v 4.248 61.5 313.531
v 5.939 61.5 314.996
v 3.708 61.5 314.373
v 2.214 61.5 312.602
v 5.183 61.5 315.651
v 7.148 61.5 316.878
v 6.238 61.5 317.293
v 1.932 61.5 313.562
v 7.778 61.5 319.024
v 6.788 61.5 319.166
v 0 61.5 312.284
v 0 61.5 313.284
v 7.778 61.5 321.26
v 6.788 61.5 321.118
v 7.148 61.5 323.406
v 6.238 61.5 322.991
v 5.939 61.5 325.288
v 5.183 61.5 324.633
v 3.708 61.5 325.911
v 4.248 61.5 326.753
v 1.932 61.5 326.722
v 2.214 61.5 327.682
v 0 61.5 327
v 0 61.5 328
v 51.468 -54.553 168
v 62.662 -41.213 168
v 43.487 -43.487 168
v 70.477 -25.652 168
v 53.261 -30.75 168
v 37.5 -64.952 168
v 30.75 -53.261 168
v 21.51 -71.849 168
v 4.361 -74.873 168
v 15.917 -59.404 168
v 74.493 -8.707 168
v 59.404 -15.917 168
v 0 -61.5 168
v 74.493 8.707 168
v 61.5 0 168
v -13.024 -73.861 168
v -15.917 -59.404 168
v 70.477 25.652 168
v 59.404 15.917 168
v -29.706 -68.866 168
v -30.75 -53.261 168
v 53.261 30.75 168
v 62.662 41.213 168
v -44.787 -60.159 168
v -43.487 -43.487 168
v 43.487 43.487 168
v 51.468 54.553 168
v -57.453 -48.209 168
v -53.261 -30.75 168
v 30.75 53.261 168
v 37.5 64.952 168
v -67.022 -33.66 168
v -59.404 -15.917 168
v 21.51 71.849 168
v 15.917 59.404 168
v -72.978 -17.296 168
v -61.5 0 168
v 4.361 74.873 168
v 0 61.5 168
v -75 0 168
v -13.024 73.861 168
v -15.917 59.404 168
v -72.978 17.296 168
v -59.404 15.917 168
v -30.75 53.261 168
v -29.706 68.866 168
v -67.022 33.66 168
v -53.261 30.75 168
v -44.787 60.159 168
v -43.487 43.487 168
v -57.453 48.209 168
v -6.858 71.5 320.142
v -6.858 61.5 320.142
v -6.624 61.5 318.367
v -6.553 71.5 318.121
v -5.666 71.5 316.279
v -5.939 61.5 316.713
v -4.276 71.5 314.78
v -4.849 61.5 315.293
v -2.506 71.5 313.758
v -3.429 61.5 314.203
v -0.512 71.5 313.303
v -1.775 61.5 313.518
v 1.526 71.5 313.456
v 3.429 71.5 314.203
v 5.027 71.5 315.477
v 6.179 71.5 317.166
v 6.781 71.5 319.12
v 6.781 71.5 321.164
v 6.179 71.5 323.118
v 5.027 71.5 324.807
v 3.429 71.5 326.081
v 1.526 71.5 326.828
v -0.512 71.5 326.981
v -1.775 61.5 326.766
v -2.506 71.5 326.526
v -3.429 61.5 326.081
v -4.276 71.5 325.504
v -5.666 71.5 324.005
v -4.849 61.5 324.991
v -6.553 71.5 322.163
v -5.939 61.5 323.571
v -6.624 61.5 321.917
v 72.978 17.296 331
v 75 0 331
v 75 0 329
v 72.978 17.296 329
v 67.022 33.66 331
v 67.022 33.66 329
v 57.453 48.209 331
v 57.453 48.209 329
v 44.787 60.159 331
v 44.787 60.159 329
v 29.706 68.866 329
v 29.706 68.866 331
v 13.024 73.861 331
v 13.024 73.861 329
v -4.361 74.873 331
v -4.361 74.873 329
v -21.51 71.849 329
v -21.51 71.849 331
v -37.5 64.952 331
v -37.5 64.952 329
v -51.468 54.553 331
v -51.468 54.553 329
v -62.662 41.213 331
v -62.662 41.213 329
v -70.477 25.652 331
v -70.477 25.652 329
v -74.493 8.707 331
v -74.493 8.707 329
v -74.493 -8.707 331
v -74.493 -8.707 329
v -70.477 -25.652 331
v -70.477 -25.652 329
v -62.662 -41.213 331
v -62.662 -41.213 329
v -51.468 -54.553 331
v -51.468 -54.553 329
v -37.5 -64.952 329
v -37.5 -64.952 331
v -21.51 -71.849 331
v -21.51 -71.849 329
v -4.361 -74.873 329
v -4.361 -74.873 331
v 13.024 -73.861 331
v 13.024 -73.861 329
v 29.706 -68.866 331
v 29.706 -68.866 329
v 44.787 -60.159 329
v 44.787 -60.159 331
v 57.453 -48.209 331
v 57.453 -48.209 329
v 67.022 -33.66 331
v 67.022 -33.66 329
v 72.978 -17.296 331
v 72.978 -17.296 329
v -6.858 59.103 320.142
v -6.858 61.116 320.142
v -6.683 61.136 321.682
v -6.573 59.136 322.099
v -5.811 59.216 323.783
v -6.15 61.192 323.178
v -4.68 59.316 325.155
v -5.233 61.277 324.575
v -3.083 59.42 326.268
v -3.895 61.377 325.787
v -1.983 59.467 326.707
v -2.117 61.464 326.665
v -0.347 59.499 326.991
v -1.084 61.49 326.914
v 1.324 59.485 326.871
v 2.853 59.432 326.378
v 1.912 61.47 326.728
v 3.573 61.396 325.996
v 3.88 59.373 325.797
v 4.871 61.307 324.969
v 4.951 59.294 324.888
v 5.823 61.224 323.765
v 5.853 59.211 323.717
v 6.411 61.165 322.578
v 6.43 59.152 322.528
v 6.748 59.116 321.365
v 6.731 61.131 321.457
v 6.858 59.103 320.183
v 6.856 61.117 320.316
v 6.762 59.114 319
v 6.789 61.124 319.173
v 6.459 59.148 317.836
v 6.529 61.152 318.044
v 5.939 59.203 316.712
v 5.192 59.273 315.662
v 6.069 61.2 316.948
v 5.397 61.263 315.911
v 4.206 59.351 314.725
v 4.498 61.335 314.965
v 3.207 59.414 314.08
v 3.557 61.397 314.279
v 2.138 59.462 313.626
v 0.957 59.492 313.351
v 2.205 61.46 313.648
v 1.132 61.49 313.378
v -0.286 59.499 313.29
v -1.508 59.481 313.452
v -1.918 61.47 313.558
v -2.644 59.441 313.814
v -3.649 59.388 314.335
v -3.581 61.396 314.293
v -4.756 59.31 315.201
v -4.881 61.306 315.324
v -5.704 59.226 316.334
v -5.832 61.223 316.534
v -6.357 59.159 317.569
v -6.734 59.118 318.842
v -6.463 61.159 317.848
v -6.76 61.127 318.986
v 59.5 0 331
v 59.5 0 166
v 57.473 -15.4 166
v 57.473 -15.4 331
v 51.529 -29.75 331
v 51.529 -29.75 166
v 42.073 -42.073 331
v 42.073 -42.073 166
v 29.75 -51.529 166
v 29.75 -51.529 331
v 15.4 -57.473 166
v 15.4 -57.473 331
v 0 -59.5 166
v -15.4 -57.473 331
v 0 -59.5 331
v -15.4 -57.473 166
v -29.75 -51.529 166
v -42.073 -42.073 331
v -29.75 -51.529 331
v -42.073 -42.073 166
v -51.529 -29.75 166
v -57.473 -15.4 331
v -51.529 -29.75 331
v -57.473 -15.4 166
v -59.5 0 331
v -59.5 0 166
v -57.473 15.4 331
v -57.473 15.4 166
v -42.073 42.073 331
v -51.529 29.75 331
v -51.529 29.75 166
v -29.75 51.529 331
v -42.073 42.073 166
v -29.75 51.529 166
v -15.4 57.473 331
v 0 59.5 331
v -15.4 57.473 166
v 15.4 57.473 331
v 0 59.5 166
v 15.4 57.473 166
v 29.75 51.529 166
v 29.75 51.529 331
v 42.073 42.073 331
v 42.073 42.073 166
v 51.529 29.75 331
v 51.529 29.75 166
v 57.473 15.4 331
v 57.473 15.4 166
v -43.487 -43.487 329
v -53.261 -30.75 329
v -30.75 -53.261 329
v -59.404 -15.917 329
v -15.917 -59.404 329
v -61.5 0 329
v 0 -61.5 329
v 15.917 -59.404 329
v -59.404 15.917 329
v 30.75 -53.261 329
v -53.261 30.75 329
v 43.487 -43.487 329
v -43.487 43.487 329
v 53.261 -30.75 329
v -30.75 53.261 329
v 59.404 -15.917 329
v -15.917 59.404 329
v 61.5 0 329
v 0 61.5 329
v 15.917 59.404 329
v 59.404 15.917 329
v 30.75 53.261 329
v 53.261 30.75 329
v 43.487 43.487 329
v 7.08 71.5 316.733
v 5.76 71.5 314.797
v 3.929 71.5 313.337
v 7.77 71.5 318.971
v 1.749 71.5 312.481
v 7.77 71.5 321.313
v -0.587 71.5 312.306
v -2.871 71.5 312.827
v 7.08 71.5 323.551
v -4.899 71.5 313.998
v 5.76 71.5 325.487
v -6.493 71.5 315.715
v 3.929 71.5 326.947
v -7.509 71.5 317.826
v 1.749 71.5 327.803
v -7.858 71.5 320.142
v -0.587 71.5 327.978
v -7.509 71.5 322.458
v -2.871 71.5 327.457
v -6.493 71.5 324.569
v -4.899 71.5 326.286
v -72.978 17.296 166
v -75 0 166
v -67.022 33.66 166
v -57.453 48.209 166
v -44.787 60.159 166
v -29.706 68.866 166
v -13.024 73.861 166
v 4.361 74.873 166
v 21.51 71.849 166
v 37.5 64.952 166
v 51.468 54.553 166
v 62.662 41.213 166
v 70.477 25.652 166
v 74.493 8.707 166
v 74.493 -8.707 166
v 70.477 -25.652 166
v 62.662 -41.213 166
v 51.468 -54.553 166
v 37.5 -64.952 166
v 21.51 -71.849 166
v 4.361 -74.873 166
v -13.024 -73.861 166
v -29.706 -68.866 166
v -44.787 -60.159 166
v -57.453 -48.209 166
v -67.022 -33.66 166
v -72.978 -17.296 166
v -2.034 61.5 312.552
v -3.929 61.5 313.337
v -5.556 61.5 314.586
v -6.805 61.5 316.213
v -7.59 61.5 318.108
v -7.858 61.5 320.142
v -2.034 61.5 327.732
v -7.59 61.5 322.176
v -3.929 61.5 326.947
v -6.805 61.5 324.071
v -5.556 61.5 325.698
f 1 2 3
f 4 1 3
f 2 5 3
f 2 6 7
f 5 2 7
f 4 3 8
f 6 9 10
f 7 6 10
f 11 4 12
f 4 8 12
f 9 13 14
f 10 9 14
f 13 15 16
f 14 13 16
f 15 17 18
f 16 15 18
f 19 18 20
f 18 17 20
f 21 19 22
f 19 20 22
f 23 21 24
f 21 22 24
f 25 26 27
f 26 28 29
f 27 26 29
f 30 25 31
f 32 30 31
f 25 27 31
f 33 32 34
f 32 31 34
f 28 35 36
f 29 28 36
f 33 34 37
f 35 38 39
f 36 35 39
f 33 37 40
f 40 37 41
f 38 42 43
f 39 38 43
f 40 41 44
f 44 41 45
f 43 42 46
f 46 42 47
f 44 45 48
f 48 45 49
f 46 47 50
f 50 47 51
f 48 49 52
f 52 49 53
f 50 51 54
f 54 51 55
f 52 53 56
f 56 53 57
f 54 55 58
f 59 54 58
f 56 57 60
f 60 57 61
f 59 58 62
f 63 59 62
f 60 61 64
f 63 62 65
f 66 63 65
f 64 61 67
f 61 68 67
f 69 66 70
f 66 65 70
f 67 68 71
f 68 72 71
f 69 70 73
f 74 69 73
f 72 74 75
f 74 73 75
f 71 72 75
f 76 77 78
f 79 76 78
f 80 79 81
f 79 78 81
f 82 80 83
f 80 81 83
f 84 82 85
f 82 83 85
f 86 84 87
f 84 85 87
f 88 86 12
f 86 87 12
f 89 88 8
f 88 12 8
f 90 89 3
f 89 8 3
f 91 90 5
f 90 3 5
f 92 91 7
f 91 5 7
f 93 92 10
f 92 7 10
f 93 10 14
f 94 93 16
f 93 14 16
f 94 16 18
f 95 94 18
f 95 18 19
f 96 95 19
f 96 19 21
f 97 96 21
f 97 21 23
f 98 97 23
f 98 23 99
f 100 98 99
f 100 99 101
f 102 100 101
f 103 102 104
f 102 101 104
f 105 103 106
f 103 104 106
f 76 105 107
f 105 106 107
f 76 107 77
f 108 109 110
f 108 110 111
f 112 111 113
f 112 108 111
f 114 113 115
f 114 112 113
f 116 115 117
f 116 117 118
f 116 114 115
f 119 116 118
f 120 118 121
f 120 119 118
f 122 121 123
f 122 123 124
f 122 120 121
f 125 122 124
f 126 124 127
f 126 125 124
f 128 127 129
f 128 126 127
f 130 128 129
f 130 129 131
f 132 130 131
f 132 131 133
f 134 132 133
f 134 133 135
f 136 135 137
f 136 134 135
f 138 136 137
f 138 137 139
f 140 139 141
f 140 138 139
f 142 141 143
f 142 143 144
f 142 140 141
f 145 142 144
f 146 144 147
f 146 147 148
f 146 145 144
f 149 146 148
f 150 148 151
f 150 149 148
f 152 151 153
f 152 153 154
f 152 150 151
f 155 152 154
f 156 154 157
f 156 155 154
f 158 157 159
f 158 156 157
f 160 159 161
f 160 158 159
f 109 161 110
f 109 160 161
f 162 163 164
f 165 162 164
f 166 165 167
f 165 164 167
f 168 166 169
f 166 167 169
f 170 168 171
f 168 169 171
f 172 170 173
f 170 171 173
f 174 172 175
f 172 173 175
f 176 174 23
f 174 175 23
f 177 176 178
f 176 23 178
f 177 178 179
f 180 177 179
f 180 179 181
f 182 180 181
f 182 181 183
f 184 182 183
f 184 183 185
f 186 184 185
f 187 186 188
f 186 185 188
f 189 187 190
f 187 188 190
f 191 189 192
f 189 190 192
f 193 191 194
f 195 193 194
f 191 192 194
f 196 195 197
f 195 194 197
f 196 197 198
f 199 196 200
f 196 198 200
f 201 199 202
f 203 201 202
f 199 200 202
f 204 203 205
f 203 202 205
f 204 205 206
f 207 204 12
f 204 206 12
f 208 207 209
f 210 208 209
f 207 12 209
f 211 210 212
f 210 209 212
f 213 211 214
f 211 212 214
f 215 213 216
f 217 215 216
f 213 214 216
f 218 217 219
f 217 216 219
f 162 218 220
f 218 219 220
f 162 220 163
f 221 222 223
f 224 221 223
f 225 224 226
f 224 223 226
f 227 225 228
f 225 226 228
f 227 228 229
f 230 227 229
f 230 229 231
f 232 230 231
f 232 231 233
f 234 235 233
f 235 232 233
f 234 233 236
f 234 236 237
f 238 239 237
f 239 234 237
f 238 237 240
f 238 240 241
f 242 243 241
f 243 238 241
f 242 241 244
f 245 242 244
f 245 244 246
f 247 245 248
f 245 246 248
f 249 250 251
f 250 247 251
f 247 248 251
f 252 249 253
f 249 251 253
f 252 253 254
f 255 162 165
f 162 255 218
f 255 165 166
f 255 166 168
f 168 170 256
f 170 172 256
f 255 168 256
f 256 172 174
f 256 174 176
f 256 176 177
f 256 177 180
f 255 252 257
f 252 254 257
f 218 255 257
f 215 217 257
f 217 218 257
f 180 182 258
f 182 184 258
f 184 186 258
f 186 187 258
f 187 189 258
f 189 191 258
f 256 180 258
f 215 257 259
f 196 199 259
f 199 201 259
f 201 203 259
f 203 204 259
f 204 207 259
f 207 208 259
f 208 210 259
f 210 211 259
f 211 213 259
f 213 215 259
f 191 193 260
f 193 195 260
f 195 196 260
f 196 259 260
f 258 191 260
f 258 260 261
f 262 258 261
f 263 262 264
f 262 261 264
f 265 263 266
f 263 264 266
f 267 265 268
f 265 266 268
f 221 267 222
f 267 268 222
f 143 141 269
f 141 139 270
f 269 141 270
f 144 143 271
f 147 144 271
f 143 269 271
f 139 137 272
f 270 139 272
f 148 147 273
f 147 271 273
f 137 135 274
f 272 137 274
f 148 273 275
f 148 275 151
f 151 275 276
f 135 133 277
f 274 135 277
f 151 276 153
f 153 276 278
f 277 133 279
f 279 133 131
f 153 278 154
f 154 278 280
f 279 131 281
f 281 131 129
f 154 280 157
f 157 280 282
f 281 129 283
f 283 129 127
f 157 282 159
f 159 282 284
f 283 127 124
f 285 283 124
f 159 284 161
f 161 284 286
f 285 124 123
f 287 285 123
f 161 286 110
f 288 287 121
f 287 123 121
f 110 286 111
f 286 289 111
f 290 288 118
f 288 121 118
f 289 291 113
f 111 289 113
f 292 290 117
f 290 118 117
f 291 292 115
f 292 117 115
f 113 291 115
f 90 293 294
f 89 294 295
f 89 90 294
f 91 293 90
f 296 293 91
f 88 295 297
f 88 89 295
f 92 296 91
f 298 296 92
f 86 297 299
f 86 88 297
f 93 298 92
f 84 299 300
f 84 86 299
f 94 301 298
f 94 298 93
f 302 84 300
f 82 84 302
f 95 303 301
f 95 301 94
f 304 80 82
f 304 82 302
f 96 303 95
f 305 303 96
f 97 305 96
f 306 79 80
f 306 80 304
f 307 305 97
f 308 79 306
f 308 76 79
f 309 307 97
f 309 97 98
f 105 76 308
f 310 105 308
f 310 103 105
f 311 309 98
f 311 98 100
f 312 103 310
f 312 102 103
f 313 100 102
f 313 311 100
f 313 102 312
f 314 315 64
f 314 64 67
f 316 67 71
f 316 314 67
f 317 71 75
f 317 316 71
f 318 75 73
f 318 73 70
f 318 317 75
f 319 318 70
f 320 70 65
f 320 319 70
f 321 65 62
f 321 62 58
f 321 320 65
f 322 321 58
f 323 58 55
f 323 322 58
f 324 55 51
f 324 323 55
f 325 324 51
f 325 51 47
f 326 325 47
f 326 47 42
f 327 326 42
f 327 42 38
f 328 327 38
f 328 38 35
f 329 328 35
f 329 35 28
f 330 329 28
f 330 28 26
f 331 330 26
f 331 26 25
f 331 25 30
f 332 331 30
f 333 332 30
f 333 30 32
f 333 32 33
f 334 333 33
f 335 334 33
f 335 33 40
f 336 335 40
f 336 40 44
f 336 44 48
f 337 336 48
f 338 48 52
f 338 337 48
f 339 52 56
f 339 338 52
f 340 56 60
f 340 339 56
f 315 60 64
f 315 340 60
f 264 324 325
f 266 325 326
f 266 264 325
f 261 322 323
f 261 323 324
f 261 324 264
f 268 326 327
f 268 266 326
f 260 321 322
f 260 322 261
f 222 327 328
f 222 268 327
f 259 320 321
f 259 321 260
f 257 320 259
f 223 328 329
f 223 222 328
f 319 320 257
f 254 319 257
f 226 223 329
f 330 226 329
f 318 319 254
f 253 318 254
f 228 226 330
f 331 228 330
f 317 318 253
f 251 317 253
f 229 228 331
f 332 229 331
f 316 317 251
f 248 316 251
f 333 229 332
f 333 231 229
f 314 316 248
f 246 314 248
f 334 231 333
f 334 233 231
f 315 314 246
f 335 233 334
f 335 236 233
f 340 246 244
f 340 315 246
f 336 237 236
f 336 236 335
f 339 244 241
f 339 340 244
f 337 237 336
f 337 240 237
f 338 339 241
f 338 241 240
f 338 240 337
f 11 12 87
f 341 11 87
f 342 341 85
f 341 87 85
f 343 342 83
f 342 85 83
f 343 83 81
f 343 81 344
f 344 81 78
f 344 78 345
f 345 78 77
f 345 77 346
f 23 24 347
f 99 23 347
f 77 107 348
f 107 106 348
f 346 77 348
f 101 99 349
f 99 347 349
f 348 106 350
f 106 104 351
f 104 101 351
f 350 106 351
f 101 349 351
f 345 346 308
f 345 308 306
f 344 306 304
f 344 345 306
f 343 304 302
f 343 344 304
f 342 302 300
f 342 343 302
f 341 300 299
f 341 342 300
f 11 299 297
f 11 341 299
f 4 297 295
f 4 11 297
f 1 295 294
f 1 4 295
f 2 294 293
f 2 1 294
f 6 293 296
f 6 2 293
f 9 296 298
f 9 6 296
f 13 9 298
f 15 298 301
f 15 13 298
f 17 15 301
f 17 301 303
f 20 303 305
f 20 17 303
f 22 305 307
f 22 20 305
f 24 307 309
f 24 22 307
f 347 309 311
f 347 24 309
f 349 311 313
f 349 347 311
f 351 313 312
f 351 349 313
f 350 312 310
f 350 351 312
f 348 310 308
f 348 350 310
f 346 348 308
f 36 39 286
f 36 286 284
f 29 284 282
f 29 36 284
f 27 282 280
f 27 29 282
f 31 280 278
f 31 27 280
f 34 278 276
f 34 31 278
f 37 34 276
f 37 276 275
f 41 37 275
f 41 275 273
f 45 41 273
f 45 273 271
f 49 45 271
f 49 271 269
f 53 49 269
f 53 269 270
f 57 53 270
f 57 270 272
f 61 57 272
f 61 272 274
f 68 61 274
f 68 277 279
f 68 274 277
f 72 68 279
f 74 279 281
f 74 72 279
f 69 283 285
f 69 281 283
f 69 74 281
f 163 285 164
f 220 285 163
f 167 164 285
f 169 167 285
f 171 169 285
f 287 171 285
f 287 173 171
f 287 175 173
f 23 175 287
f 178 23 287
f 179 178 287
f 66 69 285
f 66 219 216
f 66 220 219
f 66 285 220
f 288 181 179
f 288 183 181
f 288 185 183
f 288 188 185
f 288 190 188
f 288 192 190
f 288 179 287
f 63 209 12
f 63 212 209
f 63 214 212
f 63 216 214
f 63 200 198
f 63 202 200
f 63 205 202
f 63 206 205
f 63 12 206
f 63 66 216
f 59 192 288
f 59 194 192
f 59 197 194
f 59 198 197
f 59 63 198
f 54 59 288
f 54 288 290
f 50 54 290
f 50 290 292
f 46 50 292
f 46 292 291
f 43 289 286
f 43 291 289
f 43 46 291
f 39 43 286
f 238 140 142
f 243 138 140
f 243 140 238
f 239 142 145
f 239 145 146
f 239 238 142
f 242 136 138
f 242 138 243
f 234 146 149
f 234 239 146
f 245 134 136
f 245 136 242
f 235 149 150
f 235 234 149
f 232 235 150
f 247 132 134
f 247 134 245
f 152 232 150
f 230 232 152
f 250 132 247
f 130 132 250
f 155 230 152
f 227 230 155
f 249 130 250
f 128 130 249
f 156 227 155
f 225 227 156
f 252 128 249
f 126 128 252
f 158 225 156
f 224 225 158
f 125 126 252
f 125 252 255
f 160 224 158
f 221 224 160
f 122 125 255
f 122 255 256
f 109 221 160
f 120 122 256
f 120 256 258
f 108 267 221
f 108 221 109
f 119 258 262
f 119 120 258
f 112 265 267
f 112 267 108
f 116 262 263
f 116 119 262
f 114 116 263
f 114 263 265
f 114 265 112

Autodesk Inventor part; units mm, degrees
ref_plane "YZ Plane" through (0, 0, 0) normal (1, 0, 0) x (0, 1, 0)
ref_plane "XY Plane" through (0, 0, 0) normal (0, 0, 1) x (1, 0, 0)
sketch "Sketch1" plane through (0, 0, 0) normal (0, 0, 1) x (1, 0, 0)
  circle A0 centre (0, 0) radius 59.5
  circle A1 centre (0, 0) radius 61.5
  dimension "d0" = 119
  dimension "d1" = 123
extrude "Extrusion1" add sketch "Sketch1" along normal blind 331
ref_plane "Work Plane1" through (0, 61.5, 0) normal (0, 1, 0) x (-1, 0, 0)
sketch "Sketch2" plane through (0, 61.5, 0) normal (0, 1, 0) x (-1, 0, 0)
  line L0 (61.5, 0) -> (-61.5, 0) projected
  line L1 (0, 0) -> (0, 4)
  line L2 (0, 4) -> (0, 8.666)
  circle A0 centre (0, 15.524) radius 6.858
  circle A1 centre (0, 15.524) radius 7.858
  dimension "d6" = 4
  dimension "d7" = 4.666
  dimension "d8" = 13.716
  dimension "d9" = 6.858
  dimension "d33" = 15.716
extrude "Extrusion2" cut sketch "Sketch2" against normal blind 23 contours A0
sketch "Sketch3" plane through (0, 61.5, 0) normal (0, 1, 0) x (-1, 0, 0)
  line L0 (0, 0) -> (0, 331) construction
  line L1 (-59.5, 331) -> (59.5, 331) projected
  line L2 (0, 331) -> (0, 323) construction
  circle A0 centre (0, 320.142) radius 6.858
  circle A1 centre (0, 320.142) radius 7.858
  point P0 (0, 327)
  dimension "d12" = 8
  dimension "d13" = 13.716
  dimension "d14" = 6.858
  dimension "d36" = 15.716
extrude "Extrusion3" cut sketch "Sketch3" against normal blind 3 contours A0
thread "Thread1" size "M14x1.25" class "6H" standard "ANSI Metric M Profile" full length
thread "Thread2" size "M14x1.25" class "6H" standard "ANSI Metric M Profile" full length
sketch "Sketch4" plane through (0, 61.5, 0) normal (0, 1, 0) x (-1, 0, 0)
  point P0 (0, 0)
sketch "Sketch5" plane through (0, 61.5, 0) normal (0, 1, 0) x (-1, 0, 0)
  line L0 (0, 0) -> (0, 76) construction
  circle A0 centre (0, 76) radius 4
  dimension "d21" = 76
  dimension "d22" = 8
extrude "Extrusion4" cut sketch "Sketch5" against normal through all
thread "Thread3" size "M8x1.25" class "6H" standard "ANSI Metric M Profile" full length
thread "Thread4" size "M8x1.25" class "6H" standard "ANSI Metric M Profile" full length
sketch "Sketch6" plane through (0, 0, 331) normal (0, 0, 1) x (1, 0, 0)
  circle A0 centre (0, 0) radius 75
  circle A1 centre (0, 0) radius 61.5
  dimension "d29" = 150
  dimension "d30" = 123
extrude "Extrusion5" add sketch "Sketch6" against normal blind 2
extrude "Extrusion6" add sketch "Sketch2" along normal blind 10
extrude "Extrusion7" add sketch "Sketch3" along normal blind 10
ref_plane "Work Plane2" through (0, 0, 166) normal (0, 0, -1) x (-1, 0, 0)
split_face "Split2"
sketch "Sketch7" plane through (0, 0, 166) normal (0, 0, -1) x (-1, 0, 0)
  circle A0 centre (0, 0) radius 75
  circle A1 centre (0, 0) radius 59.5 projected
  circle A2 centre (0, 0) radius 59.5
  dimension "d40" = 150
extrude "Extrusion8" add sketch "Sketch7" along normal blind 2
extrude "Extrusion9" add sketch "Sketch7" against normal blind 2
split "Split3" plane through (0, 0, 166) removes the side toward (0, 0, -1)
properties part number "stainless steel outer wall front" material "Aluminum 6061"
